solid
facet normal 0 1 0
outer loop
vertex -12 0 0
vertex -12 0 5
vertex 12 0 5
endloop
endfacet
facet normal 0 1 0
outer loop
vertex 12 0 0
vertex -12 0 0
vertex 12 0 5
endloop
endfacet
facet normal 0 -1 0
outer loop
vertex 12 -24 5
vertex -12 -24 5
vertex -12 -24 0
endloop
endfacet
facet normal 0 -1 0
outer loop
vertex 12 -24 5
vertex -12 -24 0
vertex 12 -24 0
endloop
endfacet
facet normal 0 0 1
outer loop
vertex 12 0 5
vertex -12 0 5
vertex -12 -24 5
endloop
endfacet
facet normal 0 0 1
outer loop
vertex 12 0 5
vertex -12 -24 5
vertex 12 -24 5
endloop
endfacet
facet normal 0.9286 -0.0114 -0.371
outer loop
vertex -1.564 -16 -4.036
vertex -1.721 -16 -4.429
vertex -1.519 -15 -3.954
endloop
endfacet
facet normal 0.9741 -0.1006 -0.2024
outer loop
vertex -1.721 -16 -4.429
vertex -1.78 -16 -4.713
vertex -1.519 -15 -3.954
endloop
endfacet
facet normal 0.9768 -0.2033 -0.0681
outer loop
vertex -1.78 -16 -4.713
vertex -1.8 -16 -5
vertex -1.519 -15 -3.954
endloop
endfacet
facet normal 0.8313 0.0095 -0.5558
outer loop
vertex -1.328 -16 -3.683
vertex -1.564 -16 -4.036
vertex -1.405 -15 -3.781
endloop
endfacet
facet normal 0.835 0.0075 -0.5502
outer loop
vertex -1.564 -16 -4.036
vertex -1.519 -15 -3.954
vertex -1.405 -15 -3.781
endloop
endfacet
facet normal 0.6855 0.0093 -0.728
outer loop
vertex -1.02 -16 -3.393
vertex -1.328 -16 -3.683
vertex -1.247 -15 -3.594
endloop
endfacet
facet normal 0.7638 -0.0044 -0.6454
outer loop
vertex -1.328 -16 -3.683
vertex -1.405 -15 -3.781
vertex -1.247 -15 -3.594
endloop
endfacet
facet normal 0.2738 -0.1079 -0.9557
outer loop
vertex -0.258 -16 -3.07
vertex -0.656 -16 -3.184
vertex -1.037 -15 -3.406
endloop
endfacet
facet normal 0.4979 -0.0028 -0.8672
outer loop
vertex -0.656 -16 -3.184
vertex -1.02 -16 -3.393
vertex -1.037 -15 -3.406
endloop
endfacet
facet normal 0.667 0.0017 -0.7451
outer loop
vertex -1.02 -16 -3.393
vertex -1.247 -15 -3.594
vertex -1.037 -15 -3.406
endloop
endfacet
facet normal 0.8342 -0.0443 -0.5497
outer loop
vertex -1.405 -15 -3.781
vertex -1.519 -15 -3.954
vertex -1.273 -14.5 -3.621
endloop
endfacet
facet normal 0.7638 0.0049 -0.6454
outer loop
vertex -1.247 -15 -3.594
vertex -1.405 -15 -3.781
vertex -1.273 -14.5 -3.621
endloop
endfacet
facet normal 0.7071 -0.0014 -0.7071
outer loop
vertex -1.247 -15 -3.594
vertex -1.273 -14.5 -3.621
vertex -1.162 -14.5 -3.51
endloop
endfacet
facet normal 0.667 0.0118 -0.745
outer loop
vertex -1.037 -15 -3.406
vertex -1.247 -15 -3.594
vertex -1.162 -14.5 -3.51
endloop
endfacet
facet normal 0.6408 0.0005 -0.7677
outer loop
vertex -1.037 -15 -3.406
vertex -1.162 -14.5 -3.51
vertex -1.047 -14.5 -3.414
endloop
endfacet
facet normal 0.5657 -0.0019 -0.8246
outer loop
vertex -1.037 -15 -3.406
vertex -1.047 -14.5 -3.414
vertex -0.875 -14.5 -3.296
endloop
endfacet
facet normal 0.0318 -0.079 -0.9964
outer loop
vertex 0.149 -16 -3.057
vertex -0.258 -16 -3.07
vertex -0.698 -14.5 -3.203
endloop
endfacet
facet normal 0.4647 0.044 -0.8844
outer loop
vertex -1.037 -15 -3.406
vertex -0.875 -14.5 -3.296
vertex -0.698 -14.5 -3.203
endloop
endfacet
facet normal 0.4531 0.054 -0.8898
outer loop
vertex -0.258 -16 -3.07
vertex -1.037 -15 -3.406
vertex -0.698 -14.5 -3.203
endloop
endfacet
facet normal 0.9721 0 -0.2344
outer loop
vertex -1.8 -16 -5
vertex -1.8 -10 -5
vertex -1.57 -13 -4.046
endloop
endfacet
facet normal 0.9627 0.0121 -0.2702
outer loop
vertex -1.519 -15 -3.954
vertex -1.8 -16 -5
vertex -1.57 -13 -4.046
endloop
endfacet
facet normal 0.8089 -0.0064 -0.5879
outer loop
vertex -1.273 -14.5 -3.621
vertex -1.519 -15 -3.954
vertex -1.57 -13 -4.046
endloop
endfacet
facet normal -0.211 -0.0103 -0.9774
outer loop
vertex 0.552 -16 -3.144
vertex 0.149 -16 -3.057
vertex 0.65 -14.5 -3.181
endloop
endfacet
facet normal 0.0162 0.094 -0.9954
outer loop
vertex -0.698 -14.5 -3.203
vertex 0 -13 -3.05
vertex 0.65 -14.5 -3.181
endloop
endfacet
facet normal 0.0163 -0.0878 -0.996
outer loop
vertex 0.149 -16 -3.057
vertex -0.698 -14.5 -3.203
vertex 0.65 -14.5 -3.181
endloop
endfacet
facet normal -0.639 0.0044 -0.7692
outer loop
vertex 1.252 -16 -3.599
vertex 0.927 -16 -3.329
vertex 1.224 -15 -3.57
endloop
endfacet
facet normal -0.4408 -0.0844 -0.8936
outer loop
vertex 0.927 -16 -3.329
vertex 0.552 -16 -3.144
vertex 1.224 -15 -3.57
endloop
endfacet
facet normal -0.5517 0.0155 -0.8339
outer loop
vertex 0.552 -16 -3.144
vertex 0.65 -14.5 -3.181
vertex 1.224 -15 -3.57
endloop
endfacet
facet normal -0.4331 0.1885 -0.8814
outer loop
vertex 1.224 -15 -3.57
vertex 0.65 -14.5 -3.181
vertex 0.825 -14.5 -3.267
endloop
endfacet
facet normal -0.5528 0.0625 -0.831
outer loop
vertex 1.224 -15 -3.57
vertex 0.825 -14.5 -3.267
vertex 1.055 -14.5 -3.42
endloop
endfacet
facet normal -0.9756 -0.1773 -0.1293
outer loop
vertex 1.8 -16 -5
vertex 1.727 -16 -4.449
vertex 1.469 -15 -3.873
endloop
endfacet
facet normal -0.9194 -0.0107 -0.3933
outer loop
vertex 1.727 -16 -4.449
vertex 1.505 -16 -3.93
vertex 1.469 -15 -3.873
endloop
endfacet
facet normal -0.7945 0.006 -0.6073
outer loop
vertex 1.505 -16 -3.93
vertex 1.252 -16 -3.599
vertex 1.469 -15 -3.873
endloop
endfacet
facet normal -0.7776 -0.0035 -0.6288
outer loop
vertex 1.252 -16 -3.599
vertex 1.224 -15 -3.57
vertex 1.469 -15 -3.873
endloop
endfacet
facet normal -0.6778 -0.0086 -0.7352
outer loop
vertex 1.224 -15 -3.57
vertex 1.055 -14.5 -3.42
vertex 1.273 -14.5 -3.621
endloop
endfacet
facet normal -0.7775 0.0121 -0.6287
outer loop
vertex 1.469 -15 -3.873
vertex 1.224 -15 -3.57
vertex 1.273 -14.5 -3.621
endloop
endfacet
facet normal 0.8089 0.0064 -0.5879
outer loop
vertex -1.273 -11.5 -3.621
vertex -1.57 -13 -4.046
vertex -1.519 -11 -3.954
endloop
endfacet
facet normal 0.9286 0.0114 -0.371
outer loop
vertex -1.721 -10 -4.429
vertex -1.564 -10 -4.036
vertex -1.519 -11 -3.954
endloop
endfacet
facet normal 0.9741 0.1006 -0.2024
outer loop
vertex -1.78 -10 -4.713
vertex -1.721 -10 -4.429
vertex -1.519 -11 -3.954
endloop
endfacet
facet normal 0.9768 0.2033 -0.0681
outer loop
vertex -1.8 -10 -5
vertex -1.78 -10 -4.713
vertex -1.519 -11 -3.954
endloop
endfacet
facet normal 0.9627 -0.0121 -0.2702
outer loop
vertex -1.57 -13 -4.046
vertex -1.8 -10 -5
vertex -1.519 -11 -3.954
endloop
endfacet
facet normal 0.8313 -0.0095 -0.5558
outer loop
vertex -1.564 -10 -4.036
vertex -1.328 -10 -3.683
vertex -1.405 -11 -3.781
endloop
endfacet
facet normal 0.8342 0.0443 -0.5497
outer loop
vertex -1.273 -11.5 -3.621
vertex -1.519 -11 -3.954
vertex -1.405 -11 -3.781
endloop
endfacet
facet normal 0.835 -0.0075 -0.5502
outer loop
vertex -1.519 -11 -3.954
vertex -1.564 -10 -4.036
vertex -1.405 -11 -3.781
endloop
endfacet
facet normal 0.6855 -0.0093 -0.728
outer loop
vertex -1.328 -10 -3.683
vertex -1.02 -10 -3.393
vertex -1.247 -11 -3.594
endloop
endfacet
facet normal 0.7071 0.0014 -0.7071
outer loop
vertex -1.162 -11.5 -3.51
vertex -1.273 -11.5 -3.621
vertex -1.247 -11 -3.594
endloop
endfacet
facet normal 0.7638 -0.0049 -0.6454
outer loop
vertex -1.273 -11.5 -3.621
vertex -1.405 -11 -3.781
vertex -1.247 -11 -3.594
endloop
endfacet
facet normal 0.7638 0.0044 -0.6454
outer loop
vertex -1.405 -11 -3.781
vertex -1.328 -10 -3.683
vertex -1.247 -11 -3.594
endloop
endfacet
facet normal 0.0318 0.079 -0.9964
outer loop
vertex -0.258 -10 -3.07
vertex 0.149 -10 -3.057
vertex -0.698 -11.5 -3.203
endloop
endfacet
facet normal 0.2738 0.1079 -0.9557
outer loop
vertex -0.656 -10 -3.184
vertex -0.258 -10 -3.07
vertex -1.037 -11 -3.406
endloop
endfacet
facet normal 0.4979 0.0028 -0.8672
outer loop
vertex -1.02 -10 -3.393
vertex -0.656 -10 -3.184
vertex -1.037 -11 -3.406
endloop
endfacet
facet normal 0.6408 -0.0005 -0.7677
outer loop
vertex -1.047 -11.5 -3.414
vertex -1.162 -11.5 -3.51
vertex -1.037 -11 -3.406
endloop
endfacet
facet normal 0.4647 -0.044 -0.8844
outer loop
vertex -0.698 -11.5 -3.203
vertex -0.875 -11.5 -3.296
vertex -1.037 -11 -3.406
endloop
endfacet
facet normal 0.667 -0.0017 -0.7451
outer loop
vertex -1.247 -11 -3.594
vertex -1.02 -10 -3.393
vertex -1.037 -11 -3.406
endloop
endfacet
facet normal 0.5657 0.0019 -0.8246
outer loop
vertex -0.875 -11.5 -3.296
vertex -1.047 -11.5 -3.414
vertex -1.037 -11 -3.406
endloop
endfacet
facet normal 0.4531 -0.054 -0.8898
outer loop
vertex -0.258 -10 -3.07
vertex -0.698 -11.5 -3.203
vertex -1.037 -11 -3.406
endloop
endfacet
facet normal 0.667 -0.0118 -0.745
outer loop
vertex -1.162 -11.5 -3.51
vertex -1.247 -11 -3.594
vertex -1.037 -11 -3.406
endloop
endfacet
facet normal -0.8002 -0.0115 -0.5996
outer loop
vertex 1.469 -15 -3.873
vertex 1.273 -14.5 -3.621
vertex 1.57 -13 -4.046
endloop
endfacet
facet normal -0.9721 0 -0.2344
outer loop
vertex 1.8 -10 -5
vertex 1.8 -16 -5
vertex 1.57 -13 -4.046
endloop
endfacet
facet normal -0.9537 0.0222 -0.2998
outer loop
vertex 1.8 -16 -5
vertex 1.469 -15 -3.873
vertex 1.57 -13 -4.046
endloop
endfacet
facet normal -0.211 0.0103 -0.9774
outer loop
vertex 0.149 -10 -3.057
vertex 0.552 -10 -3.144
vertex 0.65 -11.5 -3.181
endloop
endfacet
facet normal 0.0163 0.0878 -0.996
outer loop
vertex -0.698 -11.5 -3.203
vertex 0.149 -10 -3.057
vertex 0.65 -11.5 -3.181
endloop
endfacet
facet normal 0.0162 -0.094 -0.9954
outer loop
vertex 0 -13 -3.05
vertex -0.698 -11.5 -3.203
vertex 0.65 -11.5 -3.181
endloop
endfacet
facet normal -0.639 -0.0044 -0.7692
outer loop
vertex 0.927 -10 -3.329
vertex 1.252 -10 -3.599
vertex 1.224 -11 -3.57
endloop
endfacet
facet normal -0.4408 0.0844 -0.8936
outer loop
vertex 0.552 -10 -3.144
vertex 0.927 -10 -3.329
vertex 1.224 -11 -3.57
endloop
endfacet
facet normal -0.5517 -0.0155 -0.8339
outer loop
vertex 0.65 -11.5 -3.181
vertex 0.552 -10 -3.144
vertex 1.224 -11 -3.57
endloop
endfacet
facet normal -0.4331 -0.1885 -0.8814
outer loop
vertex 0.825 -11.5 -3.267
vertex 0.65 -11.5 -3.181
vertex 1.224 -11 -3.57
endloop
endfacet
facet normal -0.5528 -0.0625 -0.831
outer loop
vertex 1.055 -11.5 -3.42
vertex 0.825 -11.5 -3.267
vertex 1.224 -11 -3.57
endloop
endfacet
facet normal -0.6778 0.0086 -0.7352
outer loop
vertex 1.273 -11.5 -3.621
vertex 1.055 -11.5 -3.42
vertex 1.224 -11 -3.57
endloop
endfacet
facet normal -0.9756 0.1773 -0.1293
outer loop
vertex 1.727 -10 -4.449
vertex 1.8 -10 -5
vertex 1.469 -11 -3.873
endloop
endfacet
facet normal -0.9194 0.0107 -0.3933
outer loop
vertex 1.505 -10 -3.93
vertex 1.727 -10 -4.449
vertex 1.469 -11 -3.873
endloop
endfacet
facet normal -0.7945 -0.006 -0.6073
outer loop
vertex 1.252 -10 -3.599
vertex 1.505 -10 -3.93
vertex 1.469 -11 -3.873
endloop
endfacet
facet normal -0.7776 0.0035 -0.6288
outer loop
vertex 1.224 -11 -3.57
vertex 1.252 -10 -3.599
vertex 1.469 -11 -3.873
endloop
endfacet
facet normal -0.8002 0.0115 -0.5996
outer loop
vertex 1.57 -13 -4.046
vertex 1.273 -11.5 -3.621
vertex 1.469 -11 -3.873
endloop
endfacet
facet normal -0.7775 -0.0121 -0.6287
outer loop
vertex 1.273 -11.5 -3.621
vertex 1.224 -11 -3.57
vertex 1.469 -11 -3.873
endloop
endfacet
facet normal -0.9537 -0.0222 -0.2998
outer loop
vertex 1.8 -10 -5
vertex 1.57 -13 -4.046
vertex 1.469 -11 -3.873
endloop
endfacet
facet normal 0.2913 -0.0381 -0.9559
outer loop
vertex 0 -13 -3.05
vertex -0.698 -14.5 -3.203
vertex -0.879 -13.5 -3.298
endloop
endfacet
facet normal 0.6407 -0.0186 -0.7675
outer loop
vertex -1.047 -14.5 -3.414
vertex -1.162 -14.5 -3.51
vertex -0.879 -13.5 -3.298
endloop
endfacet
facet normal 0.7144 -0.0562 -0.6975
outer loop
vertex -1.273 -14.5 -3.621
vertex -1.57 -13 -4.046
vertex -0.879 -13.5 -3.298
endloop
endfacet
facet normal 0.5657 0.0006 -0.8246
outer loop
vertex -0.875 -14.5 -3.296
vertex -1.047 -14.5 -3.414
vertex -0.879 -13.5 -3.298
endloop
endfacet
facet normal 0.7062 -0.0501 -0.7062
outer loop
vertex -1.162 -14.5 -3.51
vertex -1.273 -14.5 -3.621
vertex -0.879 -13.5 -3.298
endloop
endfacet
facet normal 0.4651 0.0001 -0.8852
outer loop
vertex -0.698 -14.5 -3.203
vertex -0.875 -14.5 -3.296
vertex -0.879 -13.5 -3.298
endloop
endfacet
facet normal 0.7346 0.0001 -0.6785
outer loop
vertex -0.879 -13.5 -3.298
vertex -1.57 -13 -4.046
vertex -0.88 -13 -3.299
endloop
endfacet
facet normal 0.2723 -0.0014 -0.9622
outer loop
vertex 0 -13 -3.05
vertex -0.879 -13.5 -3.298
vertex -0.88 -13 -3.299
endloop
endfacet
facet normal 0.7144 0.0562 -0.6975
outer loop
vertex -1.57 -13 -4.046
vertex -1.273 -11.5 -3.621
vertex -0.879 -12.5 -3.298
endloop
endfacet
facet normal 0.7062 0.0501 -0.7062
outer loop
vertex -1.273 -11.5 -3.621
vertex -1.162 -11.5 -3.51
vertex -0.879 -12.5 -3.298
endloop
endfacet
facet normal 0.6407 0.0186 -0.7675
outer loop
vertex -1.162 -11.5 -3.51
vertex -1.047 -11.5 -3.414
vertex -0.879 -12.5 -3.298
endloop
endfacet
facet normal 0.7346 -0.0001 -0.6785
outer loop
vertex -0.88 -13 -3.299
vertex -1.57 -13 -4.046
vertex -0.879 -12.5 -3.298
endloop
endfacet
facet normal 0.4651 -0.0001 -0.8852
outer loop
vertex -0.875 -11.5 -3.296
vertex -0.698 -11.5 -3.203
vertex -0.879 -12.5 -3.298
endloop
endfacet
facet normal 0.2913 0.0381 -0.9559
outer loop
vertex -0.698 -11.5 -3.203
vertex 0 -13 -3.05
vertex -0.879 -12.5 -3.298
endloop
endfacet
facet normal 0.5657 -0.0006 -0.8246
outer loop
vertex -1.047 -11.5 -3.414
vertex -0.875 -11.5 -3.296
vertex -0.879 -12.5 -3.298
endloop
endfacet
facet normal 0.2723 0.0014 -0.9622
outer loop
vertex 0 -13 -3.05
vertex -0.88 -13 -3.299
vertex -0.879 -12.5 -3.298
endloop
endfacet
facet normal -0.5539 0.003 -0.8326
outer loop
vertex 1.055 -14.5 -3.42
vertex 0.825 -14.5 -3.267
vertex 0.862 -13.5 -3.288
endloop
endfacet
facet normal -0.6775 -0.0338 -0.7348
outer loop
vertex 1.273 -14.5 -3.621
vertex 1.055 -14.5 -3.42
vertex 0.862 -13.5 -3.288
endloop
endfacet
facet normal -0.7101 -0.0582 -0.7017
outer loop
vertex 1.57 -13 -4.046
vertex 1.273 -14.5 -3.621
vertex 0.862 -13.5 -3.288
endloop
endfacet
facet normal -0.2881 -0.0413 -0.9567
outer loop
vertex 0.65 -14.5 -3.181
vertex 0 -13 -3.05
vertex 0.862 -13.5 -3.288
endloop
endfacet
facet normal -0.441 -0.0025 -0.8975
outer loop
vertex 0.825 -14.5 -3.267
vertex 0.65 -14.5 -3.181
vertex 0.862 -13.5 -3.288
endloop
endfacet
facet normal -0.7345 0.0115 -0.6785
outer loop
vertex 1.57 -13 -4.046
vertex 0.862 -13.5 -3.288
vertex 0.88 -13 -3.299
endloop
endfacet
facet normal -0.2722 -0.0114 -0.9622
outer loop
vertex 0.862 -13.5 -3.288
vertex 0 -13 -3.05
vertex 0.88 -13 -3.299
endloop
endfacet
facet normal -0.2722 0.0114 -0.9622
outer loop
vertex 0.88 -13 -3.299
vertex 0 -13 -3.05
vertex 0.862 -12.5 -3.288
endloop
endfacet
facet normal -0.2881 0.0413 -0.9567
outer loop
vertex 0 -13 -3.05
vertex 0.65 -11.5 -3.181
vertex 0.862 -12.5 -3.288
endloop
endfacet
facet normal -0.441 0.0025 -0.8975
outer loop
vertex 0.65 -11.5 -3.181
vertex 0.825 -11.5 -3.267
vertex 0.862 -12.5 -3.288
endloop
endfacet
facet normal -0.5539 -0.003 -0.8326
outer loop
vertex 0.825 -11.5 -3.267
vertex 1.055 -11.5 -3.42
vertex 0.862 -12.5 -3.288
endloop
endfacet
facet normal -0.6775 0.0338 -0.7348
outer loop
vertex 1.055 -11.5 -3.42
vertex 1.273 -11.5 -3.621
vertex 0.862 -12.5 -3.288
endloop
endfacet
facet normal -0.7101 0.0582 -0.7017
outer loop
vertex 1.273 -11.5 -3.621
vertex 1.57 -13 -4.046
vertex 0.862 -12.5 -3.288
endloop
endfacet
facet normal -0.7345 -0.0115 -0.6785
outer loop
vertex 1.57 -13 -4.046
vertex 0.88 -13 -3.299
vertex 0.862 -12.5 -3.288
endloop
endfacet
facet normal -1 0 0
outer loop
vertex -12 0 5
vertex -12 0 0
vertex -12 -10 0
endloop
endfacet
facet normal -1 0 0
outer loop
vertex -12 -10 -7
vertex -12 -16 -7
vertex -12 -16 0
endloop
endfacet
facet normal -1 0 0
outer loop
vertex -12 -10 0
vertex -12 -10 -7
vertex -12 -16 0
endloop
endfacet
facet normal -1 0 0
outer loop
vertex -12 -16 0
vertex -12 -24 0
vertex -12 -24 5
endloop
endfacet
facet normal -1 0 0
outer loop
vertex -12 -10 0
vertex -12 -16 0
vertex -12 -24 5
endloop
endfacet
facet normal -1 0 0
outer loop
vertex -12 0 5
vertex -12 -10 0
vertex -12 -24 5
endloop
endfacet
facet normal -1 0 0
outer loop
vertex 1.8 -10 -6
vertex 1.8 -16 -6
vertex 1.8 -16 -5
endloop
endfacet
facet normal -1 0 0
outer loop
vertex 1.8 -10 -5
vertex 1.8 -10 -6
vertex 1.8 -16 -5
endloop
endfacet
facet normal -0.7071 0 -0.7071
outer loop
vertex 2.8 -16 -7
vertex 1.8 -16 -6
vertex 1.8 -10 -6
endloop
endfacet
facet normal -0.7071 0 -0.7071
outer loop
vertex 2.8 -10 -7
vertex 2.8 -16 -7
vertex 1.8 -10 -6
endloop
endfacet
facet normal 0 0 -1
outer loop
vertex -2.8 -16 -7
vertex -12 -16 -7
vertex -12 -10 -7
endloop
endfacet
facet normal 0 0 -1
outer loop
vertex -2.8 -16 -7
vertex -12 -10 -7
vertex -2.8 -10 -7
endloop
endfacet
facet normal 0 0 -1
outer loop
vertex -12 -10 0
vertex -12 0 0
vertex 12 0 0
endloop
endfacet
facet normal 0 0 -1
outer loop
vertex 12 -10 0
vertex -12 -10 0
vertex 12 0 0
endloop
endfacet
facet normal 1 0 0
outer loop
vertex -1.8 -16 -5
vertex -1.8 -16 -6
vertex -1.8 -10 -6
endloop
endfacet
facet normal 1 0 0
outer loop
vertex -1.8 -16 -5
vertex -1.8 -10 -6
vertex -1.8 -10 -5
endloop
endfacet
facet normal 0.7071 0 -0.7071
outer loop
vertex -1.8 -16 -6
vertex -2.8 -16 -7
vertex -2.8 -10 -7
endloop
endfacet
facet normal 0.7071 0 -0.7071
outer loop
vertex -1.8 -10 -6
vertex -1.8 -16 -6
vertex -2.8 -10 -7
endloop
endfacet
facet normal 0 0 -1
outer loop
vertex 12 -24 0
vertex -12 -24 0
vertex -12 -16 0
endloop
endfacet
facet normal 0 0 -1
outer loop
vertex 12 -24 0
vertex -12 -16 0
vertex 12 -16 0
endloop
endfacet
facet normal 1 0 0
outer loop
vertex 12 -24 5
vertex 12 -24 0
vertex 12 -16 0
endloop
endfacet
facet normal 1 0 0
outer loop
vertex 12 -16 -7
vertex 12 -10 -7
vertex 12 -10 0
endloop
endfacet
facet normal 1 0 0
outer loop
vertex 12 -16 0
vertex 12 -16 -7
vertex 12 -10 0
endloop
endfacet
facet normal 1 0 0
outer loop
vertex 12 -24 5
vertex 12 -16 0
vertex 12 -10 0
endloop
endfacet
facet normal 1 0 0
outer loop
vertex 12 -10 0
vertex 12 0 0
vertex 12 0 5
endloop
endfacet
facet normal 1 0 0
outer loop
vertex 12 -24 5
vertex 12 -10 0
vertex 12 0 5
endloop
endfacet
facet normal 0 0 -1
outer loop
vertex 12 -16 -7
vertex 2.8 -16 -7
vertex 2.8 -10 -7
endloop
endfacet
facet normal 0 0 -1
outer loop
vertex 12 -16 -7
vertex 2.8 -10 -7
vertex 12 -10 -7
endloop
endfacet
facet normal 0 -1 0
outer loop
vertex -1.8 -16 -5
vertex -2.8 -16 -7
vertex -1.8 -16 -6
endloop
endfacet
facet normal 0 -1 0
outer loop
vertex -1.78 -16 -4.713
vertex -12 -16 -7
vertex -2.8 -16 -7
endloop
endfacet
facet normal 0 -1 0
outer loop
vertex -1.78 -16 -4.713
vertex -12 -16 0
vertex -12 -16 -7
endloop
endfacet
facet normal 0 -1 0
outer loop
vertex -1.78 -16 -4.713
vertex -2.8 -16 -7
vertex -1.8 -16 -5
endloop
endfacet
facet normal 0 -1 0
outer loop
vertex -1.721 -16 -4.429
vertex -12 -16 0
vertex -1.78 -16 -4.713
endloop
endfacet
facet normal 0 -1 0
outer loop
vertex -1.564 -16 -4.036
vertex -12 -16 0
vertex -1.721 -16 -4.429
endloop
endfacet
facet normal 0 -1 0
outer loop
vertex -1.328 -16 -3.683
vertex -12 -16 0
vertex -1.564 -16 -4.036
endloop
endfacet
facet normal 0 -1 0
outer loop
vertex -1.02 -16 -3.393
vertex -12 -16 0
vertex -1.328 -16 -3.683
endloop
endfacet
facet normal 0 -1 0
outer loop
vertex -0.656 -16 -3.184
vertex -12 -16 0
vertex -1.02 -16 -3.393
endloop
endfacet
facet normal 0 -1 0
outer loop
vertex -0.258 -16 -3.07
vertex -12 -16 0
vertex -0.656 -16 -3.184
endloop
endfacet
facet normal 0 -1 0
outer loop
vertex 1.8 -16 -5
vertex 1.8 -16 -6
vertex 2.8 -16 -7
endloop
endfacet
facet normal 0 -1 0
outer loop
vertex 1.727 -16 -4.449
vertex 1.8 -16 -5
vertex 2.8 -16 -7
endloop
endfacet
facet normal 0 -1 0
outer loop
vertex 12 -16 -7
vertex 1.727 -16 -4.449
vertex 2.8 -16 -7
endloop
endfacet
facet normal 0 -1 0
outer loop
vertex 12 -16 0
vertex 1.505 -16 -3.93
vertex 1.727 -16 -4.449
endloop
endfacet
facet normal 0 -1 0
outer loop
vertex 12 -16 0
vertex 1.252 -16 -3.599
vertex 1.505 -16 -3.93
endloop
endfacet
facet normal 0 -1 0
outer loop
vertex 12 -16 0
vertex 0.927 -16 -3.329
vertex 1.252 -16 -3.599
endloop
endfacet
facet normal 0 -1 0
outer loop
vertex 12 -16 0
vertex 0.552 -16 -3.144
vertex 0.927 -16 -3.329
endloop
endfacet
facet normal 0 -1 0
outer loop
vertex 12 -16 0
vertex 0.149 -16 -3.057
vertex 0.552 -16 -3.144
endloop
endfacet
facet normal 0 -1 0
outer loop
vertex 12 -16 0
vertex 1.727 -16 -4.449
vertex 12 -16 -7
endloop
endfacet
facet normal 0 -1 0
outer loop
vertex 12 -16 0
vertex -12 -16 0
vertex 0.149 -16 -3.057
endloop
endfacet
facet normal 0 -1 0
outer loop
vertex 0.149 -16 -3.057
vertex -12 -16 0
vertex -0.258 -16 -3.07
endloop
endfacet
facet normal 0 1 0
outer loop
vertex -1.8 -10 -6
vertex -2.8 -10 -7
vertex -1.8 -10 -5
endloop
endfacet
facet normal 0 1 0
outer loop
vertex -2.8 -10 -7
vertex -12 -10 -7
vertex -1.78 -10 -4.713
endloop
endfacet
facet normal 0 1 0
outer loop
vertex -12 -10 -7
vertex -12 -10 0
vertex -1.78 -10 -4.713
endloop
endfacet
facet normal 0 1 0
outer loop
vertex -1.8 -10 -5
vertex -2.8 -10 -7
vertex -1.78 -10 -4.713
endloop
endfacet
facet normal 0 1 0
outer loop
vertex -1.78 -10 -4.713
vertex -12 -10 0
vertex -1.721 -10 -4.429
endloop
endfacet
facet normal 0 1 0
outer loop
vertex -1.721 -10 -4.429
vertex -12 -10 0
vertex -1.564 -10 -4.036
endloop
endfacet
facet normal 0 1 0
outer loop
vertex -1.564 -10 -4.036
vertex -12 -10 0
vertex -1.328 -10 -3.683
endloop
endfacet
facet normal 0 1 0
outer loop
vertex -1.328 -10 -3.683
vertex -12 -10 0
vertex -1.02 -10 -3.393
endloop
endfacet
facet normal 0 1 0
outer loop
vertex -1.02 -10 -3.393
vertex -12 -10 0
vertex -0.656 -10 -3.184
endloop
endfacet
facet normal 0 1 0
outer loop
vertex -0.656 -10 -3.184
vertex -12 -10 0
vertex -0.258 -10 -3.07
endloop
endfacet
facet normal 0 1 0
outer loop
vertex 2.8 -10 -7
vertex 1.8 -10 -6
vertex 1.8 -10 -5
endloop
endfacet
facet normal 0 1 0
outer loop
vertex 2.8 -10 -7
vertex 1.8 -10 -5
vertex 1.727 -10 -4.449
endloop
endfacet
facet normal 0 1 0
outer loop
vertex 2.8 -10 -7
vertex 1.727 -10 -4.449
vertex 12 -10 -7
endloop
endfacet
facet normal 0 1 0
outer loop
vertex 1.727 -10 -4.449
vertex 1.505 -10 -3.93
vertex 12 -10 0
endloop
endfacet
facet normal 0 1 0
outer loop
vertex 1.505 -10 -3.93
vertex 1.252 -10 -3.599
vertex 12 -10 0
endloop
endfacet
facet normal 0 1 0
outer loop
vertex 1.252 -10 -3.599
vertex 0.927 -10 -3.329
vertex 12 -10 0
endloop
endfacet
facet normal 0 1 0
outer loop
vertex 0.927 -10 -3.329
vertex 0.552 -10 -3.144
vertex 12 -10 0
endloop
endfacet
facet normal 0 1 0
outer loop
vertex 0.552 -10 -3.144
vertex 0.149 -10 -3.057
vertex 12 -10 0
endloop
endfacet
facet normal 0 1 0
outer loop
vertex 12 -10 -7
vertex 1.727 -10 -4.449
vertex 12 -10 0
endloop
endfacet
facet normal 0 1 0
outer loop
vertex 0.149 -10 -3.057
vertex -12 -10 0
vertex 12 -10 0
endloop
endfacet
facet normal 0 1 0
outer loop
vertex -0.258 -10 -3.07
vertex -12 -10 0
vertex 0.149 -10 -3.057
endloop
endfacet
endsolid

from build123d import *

# Parameters (mm, degrees)
F0_W     = 24
F0_H     = 10
F1_DEPTH = 24
F2_W     = 24
F2_H     = 5
F3_DEPTH = 8
F5_DEPTH = 24.001
F7_DEPTH = 10
F8_W     = 10.2
F8_H     = 2
F9_DEPTH = 6
F10_SIZE = 1


with BuildPart() as f1:
    # F0 (on Front) → F1 (new body)
    with BuildSketch(Plane.XZ):
        Rectangle(F0_W, F0_H)
    extrude(amount=F1_DEPTH)

    # F2 (on face) → F3 (cut)
    with BuildSketch(Plane.XZ.offset(24)):
        with Locations((0, -2.5)):
            Rectangle(F2_W, F2_H)
    extrude(amount=-F3_DEPTH, mode=Mode.SUBTRACT)

    # F4 (on face) → F5 (cut, through all)
    with BuildSketch(Plane(origin=(0, 0, 0), x_dir=(-1, 0, 0), z_dir=(0, 1, 0))):
        with BuildLine():
            Line((-1.8, -5), (1.8, -5))
            add(Edge.make_bspline(
                [(1.8, -5), (1.8, -3.05), (0, -3.05), (-1.8, -3.05), (-1.8, -5)],
                knots=[4.7123889804, 4.7123889804, 4.7123889804, 6.2831853072, 6.2831853072, 7.853981634, 7.853981634, 7.853981634], degree=2, weights=[1, 0.7071067812, 1, 0.7071067812, 1]))
        make_face()
    extrude(amount=-F5_DEPTH, mode=Mode.SUBTRACT)

    # F6 (on face) → F7 (cut)
    with BuildSketch(Plane(origin=(0, 0, 0), x_dir=(-1, 0, 0), z_dir=(0, 1, 0))):
        Polygon((-1.8, -5), (1.8, -5), (12, -5), (12, 0), (-12, 0), (-12, -5), align=None)
    extrude(amount=-F7_DEPTH, mode=Mode.SUBTRACT)

    # F8 (on face) → F9 (join, through all)
    with BuildSketch(Plane.XZ.offset(16)):
        with Locations((-6.9, -6)):
            Rectangle(F8_W, F8_H)
        with Locations((6.9, -6)):
            Rectangle(F8_W, F8_H)
    extrude(amount=-F9_DEPTH)

    # F10
    f10_edges = [f1.edges().sort_by_distance(p)[0] for p in [
        (-1.8, -13, -7),
        (1.8, -13, -7),
    ]]
    chamfer(f10_edges, length=F10_SIZE)


solid = f1.part
